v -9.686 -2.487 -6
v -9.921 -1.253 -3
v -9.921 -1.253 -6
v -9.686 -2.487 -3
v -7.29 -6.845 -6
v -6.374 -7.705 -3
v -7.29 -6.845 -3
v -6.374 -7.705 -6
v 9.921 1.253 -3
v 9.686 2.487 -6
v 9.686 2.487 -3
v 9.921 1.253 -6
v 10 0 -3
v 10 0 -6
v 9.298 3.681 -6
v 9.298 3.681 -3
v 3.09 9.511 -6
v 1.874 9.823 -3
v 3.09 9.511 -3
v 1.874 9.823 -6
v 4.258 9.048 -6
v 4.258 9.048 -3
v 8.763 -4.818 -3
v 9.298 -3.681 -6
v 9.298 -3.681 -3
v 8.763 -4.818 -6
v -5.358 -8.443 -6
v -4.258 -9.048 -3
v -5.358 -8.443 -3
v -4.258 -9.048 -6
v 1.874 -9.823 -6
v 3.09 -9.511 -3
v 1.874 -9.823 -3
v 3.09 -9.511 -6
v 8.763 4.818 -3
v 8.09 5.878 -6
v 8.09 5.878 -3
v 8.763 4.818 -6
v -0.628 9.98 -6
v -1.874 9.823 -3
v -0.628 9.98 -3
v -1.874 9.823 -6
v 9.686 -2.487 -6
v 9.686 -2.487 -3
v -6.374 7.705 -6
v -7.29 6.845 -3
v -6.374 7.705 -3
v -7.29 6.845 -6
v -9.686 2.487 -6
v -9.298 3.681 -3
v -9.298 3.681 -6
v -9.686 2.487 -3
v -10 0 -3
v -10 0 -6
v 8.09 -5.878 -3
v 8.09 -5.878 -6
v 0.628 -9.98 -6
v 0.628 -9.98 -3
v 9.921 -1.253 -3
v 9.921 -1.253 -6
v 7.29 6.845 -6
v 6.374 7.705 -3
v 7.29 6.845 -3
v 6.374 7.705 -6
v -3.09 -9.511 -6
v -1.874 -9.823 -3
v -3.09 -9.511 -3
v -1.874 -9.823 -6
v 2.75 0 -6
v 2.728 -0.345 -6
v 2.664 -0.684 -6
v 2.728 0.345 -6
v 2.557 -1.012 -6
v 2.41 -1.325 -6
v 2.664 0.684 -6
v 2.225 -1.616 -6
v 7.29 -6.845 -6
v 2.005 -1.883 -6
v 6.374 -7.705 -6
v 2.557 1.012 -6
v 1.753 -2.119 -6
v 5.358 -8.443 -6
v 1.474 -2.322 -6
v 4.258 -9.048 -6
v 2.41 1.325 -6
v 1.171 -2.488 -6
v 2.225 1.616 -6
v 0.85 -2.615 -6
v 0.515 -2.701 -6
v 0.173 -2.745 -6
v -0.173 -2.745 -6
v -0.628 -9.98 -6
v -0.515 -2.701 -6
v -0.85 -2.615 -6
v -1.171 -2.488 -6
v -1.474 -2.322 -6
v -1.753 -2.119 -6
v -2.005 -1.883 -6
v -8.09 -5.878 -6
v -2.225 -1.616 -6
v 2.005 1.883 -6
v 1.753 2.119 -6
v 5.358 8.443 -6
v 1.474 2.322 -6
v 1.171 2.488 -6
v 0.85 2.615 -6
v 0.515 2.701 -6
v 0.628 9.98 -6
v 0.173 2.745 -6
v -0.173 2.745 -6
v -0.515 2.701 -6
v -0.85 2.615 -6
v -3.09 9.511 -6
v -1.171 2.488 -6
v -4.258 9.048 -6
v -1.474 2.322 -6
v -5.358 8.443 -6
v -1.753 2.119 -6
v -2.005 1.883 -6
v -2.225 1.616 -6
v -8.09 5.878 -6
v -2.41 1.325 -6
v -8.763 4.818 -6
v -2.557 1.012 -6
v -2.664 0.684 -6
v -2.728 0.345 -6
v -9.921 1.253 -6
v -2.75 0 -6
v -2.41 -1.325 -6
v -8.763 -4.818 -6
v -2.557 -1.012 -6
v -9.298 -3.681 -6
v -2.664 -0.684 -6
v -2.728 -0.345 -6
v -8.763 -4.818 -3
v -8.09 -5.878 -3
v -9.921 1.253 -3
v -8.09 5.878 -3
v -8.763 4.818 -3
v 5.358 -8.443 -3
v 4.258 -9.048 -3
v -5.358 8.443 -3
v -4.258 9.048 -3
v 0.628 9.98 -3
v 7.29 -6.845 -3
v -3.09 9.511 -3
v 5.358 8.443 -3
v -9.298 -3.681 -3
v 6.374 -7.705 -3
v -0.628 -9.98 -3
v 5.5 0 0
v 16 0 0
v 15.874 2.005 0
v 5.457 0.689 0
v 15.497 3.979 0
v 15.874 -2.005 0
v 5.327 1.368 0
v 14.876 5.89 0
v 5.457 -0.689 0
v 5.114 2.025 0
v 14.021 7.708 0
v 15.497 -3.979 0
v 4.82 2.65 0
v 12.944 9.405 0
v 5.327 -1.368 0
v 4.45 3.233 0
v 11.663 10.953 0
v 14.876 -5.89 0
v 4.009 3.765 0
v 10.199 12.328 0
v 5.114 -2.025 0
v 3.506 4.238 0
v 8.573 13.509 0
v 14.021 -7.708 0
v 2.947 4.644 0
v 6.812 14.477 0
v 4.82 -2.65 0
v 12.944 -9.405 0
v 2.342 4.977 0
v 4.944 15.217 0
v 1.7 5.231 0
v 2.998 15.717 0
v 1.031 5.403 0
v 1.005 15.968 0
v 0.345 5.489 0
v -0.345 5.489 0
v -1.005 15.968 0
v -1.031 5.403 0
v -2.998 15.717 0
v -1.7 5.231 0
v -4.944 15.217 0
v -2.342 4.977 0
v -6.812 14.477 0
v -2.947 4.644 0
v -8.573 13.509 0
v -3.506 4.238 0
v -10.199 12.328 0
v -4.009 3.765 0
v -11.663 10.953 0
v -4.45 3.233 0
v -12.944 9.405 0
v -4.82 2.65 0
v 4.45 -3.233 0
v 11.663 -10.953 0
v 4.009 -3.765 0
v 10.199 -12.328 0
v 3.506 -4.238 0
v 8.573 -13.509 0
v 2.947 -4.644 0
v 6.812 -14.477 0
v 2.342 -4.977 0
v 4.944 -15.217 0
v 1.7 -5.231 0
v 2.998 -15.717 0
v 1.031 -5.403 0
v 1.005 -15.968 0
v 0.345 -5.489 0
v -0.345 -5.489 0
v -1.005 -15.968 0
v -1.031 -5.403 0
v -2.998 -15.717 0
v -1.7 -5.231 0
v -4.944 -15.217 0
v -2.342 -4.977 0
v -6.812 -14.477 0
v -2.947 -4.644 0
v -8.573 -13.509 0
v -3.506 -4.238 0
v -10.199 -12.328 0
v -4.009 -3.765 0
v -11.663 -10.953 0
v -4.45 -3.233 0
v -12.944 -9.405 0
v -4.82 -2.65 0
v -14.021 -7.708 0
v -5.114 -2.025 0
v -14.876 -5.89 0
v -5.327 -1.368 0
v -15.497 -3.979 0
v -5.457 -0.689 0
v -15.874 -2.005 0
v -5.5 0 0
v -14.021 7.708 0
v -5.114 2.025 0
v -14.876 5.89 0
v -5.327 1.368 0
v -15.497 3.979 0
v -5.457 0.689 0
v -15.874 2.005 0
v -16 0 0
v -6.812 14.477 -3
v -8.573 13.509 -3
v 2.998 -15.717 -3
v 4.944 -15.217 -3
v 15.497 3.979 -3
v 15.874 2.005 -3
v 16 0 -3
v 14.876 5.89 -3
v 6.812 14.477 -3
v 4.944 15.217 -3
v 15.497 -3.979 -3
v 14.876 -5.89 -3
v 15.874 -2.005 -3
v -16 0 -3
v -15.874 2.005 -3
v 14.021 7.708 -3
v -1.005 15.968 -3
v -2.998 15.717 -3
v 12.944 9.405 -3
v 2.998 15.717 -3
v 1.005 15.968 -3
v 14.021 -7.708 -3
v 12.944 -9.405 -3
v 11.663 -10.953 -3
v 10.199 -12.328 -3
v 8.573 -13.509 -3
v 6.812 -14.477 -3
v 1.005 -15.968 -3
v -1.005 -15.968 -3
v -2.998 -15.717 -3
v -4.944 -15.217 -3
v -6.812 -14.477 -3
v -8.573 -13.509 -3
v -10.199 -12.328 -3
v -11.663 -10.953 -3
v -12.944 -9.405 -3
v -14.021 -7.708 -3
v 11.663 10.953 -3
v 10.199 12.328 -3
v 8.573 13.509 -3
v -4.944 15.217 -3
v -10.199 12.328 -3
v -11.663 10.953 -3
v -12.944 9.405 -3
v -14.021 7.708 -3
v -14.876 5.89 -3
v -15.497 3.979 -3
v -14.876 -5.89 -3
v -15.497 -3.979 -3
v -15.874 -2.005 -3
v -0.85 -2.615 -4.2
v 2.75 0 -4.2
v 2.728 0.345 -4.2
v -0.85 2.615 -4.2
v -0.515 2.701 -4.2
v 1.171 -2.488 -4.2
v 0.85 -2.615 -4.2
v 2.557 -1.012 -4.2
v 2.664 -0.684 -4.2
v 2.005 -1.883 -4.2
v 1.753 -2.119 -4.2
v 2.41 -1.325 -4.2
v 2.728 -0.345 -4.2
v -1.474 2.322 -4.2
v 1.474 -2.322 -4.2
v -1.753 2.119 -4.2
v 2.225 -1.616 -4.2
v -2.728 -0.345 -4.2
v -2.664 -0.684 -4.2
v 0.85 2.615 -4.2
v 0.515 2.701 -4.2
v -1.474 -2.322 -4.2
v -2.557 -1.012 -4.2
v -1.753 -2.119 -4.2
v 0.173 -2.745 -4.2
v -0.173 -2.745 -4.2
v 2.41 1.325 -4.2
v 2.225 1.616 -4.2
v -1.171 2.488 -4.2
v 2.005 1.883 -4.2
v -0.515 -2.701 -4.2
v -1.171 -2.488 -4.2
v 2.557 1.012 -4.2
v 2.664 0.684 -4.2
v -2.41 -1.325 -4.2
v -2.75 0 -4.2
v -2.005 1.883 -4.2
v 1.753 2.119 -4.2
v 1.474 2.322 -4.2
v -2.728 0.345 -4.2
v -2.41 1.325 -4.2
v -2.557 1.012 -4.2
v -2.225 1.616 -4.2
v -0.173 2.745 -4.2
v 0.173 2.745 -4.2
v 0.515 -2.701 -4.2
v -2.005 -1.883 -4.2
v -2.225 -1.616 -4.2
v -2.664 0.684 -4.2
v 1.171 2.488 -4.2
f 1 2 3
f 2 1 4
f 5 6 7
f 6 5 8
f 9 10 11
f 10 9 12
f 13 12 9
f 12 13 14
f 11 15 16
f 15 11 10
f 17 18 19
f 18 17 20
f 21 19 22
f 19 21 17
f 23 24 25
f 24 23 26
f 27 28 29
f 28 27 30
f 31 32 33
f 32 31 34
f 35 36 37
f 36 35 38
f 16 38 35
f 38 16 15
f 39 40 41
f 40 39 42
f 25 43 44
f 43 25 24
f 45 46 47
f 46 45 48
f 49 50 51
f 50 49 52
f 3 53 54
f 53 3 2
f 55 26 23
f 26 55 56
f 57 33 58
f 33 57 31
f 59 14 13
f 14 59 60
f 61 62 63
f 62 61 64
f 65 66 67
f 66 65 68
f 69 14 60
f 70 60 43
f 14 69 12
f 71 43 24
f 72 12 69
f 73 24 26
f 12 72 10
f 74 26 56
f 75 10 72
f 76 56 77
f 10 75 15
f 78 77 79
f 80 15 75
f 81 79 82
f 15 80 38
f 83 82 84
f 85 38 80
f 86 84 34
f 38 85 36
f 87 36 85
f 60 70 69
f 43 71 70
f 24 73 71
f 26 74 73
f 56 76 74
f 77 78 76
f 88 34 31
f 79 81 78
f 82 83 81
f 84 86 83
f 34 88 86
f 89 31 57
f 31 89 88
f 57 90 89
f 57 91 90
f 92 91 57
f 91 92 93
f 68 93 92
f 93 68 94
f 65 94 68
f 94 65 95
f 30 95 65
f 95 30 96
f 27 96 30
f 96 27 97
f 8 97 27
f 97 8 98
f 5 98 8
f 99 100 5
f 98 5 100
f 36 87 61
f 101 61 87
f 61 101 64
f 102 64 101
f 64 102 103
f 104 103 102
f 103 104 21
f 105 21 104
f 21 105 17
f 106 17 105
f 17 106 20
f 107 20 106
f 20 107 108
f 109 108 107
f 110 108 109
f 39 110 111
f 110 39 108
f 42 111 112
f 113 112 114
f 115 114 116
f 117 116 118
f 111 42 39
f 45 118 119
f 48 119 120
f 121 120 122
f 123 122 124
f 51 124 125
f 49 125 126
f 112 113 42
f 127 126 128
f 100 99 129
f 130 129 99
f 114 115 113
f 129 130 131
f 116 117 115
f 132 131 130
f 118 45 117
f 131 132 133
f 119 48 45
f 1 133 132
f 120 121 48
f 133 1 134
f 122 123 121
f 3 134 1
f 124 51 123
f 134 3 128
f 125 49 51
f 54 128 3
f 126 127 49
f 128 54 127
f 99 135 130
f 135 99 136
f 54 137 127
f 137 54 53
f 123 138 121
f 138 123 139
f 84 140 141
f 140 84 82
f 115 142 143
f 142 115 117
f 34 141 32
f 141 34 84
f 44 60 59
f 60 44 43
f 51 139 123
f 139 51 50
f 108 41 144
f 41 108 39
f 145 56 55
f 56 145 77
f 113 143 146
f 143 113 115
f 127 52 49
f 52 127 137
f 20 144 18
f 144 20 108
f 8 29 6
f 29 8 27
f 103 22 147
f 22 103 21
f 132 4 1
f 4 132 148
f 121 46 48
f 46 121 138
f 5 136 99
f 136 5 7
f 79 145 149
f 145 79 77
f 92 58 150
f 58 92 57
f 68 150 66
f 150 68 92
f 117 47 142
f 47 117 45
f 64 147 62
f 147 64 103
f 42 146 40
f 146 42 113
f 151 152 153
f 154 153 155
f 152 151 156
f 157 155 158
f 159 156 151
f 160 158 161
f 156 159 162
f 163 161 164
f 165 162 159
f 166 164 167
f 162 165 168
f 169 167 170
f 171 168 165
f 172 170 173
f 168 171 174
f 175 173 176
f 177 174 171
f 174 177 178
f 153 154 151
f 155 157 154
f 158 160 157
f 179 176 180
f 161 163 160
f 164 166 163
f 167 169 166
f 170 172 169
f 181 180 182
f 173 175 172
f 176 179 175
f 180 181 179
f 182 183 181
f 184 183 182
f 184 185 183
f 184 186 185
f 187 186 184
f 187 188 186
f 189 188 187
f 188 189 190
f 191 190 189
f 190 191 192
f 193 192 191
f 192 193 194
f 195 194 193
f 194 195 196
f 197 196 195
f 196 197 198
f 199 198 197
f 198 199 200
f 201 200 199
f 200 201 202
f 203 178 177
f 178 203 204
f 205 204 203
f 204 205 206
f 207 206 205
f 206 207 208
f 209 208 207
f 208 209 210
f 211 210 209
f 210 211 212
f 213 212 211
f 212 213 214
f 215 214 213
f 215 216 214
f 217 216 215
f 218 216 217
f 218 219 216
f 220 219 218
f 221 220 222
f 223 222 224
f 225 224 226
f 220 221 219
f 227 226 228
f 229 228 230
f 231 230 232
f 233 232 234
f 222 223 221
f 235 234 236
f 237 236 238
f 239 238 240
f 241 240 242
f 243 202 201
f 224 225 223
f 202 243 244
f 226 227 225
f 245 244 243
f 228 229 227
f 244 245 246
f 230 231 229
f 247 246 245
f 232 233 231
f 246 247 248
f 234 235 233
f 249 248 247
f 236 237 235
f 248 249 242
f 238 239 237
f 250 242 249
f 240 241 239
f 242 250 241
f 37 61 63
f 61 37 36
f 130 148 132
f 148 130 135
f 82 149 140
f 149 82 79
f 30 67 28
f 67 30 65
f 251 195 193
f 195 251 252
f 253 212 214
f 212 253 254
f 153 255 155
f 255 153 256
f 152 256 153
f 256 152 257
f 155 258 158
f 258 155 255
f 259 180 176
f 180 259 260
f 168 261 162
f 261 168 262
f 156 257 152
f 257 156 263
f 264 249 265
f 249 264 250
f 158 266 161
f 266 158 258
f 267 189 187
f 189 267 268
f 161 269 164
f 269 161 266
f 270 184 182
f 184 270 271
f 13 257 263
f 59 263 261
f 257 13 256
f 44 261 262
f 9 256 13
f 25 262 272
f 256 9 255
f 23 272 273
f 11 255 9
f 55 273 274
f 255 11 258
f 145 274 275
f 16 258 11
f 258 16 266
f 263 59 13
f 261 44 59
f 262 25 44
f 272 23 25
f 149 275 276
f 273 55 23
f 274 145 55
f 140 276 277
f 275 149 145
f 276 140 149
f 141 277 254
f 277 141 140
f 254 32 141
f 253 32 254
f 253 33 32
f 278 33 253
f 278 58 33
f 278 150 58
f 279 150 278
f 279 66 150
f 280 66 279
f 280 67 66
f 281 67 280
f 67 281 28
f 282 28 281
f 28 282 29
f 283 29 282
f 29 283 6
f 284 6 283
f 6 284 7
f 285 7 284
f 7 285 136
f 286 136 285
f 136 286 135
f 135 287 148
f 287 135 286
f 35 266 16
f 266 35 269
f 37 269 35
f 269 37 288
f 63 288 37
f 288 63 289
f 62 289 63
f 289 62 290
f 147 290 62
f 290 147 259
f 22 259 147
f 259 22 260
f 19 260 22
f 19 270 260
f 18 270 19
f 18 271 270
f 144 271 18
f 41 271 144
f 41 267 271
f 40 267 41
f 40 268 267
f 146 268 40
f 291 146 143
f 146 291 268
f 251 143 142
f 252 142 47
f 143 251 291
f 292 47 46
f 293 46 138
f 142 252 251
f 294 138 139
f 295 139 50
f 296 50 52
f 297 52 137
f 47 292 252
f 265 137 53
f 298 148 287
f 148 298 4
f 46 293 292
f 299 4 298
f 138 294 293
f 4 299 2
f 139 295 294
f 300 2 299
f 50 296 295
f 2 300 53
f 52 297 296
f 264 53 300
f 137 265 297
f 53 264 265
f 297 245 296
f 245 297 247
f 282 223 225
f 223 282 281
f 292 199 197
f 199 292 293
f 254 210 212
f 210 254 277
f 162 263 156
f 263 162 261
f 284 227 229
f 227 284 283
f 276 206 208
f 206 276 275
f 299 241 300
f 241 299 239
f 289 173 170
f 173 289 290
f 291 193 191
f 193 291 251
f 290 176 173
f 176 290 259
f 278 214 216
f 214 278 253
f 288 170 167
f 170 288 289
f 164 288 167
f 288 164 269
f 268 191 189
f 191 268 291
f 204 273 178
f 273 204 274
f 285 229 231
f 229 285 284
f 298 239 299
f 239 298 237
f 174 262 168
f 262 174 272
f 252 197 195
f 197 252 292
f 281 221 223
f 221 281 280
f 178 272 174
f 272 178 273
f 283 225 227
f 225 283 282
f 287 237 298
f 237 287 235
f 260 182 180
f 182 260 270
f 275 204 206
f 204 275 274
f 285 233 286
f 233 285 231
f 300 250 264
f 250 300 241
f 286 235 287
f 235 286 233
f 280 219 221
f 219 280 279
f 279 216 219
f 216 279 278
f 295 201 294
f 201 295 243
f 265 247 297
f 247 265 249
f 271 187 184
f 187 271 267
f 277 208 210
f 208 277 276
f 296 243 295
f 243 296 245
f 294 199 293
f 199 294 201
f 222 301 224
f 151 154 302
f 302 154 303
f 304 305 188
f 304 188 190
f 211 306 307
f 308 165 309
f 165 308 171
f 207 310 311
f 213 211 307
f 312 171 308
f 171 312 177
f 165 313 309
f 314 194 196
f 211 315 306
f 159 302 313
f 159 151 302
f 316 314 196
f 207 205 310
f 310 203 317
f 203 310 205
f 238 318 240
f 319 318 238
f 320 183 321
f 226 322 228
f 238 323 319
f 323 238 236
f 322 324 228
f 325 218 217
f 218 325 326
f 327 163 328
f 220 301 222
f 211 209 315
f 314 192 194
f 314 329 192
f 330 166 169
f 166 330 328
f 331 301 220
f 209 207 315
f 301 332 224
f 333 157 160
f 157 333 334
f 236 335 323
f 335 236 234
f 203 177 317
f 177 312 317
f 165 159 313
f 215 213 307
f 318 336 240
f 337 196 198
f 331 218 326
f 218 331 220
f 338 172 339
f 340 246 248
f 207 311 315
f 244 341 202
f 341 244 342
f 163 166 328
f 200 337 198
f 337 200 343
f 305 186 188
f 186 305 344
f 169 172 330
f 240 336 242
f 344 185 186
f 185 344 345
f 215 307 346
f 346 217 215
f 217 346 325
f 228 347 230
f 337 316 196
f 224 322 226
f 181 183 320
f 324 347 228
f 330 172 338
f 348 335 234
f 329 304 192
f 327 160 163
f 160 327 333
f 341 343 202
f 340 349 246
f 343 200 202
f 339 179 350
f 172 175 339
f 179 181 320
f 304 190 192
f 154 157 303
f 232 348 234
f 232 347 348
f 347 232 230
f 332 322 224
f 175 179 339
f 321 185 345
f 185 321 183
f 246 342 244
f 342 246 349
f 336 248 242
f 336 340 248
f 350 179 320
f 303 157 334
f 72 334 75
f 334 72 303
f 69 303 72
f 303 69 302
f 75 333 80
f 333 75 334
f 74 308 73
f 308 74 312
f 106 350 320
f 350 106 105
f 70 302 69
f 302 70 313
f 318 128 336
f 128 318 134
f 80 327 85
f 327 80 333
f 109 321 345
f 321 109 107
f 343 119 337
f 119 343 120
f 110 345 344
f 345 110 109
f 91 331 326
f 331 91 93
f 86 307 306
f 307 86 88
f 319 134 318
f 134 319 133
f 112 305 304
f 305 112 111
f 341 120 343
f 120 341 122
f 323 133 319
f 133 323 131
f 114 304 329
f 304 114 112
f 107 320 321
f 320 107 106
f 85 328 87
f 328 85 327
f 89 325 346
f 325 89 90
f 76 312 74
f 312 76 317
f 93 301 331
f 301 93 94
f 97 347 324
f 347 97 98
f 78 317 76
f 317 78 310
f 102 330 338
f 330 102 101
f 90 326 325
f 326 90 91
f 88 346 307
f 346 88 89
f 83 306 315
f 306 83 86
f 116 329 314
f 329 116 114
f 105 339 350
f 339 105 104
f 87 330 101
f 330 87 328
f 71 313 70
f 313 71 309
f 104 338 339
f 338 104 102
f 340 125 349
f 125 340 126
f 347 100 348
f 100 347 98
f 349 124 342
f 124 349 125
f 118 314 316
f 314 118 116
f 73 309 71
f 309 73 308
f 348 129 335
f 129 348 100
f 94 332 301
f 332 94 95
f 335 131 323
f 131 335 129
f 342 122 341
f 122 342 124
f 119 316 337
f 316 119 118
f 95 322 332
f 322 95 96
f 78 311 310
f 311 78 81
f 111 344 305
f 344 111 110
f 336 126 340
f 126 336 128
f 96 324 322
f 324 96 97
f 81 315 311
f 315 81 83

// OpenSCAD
$fn = 50;


difference() {
	union() {
		translate(v = [0, 0, -6.0000000000]) {
			cylinder(h = 6, r = 10.0000000000);
		}
		translate(v = [0, 0, -3.0000000000]) {
			cylinder(h = 3, r = 16.0000000000);
		}
	}
	union() {
		translate(v = [0, 0, 0]) {
			rotate(a = [0, 0, 0]) {
				difference() {
					union() {
						#translate(v = [0, 0, -6.0000000000]) {
							cylinder(h = 6, r = 2.2500000000);
						}
						#translate(v = [0, 0, -4.2000000000]) {
							cylinder(h = 4.2000000000, r1 = 2.7500000000, r2 = 5.5000000000);
						}
						#translate(v = [0, 0, -6.0000000000]) {
							cylinder(h = 6, r = 2.7500000000);
						}
						#translate(v = [0, 0, -6.0000000000]) {
							cylinder(h = 6, r = 2.2500000000);
						}
					}
					union();
				}
			}
		}
	}
}
